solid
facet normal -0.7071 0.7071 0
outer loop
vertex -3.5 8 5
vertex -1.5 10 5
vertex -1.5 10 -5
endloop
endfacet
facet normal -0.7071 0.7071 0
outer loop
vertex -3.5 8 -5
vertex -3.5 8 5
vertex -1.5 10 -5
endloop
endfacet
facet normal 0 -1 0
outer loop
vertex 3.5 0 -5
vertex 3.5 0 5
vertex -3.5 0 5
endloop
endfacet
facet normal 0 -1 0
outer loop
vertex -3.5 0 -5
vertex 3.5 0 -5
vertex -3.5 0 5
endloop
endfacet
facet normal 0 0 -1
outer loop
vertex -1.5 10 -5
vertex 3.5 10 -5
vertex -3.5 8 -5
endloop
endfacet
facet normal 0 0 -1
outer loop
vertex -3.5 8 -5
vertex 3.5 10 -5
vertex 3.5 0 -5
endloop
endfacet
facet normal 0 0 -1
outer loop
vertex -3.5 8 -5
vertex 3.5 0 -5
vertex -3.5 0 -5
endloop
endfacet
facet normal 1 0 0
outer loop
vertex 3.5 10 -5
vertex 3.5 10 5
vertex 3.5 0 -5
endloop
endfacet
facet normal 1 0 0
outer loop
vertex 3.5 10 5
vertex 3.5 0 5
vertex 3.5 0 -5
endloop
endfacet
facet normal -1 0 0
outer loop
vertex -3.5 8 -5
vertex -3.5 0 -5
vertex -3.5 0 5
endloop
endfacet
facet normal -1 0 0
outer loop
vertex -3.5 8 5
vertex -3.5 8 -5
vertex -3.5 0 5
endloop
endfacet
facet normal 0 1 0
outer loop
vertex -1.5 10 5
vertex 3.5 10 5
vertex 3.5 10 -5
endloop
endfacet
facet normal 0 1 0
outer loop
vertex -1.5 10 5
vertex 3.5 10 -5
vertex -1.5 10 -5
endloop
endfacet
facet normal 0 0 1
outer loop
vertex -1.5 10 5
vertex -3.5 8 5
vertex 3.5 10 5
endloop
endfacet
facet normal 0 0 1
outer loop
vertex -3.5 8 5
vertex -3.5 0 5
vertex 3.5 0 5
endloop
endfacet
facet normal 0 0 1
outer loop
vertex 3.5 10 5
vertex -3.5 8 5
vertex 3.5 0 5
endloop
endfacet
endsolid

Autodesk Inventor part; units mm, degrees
ref_plane "YZ Plane" through (0, 0, 0) normal (1, 0, 0) x (0, 1, 0)
ref_plane "XZ Plane" through (0, 0, 0) normal (0, 1, 0) x (-1, 0, 0)
ref_plane "XY Plane" through (0, 0, 0) normal (0, 0, 1) x (1, 0, 0)
sketch "スケッチ1" plane through (0, 0, 0) normal (0, 1, 0) x (-1, 0, 0)
  line L0 (3.5, 5) -> (-3.5, 5)
  line L1 (-3.5, 5) -> (-3.5, -5)
  line L2 (-3.5, -5) -> (3.5, -5)
  line L3 (3.5, -5) -> (3.5, 5)
  line L4 (3.5, 5) -> (-3.5, -5) construction
  line L5 (-3.5, 5) -> (3.5, -5) construction
  point P0 (0, 0)
  dimension "d0" = 10
  dimension "d1" = 7
extrude "押し出し1" add sketch "スケッチ1" along normal blind 10
chamfer "面取り1" distance 2 angle 45 1 edges at (-3.5, 10, 0)
properties part number "terminalblock"
